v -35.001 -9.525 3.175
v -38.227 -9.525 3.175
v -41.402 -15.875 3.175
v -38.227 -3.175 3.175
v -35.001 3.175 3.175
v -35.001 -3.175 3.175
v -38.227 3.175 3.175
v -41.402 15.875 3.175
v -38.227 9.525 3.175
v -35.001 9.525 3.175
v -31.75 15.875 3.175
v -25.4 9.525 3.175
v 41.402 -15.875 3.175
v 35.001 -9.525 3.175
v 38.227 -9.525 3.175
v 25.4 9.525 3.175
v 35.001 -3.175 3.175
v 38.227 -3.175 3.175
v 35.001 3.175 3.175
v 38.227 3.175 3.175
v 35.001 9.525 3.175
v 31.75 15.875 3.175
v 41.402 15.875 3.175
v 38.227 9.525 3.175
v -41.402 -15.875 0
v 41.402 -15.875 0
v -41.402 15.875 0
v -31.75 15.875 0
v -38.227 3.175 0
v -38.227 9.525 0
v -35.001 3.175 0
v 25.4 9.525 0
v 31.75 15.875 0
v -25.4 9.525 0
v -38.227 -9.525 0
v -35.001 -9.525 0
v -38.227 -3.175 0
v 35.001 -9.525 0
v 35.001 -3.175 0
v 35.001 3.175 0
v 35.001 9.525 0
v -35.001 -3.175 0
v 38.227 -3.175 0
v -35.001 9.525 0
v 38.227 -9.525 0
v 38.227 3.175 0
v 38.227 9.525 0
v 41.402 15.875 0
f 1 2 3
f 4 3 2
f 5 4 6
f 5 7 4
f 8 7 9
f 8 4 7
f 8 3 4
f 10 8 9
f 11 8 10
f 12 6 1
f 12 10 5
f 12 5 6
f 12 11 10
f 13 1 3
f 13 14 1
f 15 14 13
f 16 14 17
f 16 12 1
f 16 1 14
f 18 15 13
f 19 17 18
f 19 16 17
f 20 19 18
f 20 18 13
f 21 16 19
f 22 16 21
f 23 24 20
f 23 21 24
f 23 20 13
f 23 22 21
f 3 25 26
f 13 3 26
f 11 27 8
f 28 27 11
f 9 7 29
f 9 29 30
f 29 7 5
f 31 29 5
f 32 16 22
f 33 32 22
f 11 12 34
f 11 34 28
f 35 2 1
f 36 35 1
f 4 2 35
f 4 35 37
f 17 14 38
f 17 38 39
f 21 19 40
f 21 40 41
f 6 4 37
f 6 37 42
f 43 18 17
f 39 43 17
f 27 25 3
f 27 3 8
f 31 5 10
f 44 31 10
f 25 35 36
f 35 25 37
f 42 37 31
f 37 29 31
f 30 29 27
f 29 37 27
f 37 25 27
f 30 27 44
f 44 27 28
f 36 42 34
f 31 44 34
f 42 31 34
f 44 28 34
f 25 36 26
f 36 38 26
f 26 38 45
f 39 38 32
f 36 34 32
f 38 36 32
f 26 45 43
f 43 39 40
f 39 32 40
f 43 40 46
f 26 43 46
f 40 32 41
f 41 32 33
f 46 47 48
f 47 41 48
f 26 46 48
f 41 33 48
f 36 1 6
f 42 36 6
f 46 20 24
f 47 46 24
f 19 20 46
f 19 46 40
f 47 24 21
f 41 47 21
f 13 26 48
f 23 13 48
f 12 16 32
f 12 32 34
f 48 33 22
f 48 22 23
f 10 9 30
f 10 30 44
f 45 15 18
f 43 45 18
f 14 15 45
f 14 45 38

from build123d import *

# Parameters (mm, degrees)
SKETCH1_W           = 82.804
SKETCH1_H           = 31.75
BOSS_EXTRUDE1_DEPTH = 3.175
SKETCH2_W           = 3.2258
SKETCH2_H           = 6.35
CUT_FOR_TAB_DEPTH   = 4.175
CUT_EXTRUDE1_DEPTH  = 4.175


with BuildPart() as part:
    # Sketch1 → Boss-Extrude1 (new body)
    with BuildSketch(Plane.XY):
        Rectangle(SKETCH1_W, SKETCH1_H)
    extrude(amount=BOSS_EXTRUDE1_DEPTH)

    # Sketch2 → cut for tab (cut, through all)
    with BuildSketch(Plane.XY.offset(3.175)):
        with Locations((-36.6141, 6.35)):
            Rectangle(SKETCH2_W, SKETCH2_H)
        with Locations((-36.6141, -6.35)):
            Rectangle(SKETCH2_W, SKETCH2_H)
    cut_for_tab = extrude(amount=-CUT_FOR_TAB_DEPTH, mode=Mode.SUBTRACT)

    # Mirror1: cut for tab across plane
    add(cut_for_tab.mirror(Plane(origin=(0, 0, 0), x_dir=(0, 0, 1), z_dir=(1, 0, 0))), mode=Mode.SUBTRACT)

    # Sketch3 → Cut-Extrude1 (cut, through all)
    with BuildSketch(Plane.XY.offset(3.175)):
        Polygon((0, 15.875), (0, 9.525), (-25.4, 9.525), (-31.75, 15.875), align=None)
    cut_extrude1 = extrude(amount=-CUT_EXTRUDE1_DEPTH, mode=Mode.SUBTRACT)

    # Mirror2: Cut-Extrude1 across plane
    add(cut_extrude1.mirror(Plane(origin=(0, 0, 0), x_dir=(0, 0, 1), z_dir=(1, 0, 0))), mode=Mode.SUBTRACT)


solid = part.part
